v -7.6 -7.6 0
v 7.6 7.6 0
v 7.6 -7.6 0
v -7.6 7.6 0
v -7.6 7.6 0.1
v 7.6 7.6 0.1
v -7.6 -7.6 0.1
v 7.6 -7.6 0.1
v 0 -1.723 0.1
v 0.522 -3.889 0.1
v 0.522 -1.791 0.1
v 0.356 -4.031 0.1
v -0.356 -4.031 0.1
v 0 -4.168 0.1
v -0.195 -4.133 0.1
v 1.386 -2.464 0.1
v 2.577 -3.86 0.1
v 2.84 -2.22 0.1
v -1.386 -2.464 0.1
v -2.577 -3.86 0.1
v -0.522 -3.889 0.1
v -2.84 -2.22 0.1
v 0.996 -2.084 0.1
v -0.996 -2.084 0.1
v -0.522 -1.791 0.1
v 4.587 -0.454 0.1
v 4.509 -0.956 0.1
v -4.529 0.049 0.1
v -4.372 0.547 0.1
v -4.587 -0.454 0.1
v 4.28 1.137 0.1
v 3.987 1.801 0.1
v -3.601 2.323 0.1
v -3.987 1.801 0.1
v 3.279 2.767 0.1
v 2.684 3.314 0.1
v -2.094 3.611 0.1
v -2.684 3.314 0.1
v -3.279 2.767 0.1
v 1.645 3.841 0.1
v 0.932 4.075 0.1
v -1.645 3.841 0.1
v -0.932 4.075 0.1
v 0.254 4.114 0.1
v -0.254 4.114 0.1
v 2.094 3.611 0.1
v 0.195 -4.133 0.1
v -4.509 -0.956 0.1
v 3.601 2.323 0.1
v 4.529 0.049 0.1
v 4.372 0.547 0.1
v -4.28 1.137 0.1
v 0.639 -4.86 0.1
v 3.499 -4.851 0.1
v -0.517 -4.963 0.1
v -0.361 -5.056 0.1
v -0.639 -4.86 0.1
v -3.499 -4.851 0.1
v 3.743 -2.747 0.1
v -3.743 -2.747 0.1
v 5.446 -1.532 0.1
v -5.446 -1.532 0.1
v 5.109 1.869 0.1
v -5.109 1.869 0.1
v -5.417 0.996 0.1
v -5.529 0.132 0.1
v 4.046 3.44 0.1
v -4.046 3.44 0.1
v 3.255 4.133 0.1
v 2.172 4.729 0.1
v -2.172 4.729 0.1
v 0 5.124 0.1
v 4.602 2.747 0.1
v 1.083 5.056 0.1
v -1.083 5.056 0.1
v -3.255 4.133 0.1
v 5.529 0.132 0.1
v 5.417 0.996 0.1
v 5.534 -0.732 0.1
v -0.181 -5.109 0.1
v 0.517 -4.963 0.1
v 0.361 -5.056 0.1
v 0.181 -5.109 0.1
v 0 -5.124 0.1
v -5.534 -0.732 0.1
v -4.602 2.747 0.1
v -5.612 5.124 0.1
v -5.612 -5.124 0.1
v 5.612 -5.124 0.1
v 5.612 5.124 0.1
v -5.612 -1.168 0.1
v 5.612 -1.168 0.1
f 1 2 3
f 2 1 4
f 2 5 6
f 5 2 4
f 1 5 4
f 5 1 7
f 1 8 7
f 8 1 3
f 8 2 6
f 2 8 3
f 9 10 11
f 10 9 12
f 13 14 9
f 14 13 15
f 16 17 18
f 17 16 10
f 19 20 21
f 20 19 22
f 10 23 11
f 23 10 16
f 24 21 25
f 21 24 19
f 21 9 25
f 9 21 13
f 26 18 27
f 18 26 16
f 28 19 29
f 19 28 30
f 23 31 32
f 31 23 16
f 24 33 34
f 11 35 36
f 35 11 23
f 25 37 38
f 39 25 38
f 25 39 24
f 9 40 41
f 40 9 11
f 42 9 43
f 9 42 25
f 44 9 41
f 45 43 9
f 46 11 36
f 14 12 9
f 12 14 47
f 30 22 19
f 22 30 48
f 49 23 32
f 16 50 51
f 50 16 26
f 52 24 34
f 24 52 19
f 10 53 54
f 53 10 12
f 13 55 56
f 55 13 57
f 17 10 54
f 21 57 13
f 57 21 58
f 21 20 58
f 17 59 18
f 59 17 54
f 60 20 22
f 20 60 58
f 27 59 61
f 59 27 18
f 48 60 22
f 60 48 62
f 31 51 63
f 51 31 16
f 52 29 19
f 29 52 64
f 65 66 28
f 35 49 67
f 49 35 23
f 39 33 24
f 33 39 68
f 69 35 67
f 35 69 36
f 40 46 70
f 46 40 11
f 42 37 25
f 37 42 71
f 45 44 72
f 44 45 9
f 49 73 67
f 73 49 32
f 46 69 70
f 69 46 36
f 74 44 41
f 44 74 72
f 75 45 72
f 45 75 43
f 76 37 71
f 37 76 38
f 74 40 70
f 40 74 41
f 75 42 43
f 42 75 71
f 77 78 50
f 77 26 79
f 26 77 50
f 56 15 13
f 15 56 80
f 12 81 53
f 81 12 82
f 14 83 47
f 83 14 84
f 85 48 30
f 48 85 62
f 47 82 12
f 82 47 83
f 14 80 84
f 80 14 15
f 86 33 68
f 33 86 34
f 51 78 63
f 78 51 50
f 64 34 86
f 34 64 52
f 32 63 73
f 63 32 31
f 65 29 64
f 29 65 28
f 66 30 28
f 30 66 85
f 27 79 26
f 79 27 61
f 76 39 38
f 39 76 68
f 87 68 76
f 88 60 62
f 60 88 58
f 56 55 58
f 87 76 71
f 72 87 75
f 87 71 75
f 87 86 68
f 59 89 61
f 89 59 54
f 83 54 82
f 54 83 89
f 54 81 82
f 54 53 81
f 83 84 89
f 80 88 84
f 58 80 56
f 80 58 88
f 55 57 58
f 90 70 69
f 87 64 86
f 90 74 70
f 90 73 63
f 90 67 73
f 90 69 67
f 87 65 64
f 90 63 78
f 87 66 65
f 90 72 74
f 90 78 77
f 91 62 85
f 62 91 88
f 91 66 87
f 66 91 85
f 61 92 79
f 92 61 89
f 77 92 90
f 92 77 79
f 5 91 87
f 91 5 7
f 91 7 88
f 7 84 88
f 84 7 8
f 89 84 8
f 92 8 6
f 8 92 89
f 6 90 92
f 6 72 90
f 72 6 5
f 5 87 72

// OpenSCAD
// file: ../p/box5-12.scad
use <../lib.scad>
function ldraw_lib__box5_12() = [
// 0 Box with 5 Faces without Any Edges
// 0 Name: box5-12.dat
// 0 Author: Chris Dee [cwdee]
// 0 !LDRAW_ORG Primitive UPDATE 2009-02
// 0 !LICENSE Licensed under CC BY 2.0 and CC BY 4.0 : see CAreadme.txt
// 
// 0 BFC CERTIFY CCW
  [0,"BFC","CERTIFY"],
  [0,"BFC","CCW"],
// 
// 0 !HISTORY 2009-09-03 [PTadmin] Official Update 2009-02
// 
// 
// 4 16 1 1 1 1 1 -1 -1 1 -1 -1 1 1
  [4,16,1,1,1,1,1,-1,-1,1,-1,-1,1,1],
// 4 16 -1 0 1 1 0 1 1 1 1 -1 1 1
  [4,16,-1,0,1,1,0,1,1,1,1,-1,1,1],
// 4 16 -1 0 -1 -1 0 1 -1 1 1 -1 1 -1
  [4,16,-1,0,-1,-1,0,1,-1,1,1,-1,1,-1],
// 4 16 1 0 -1 -1 0 -1 -1 1 -1 1 1 -1
  [4,16,1,0,-1,-1,0,-1,-1,1,-1,1,1,-1],
// 4 16 1 0 1 1 0 -1 1 1 -1 1 1 1
  [4,16,1,0,1,1,0,-1,1,1,-1,1,1,1],
// 0
];
module ldraw_lib__box5_12(step=0, col=false, unit=2/5, alt=false, line=0.2, solid=!$preview)
    makepoly(ldraw_lib__box5_12(), step=step, col=col, unit=unit, alt=alt, line=line, solid=solid);
ldraw_lib__box5_12(line=0.2);
// main file
use <../lib.scad>
use <../p/box5-12.scad>
use <s/3004s60.scad>
function ldraw_lib__004695b() = [
// 0 Sticker  1.9 x  1.9 with Shell Logo
// 0 Name: 004695b.dat
// 0 Author: J.C. Tchang [tchang]
// 0 !LDRAW_ORG Part UPDATE 2014-01
// 0 !LICENSE Licensed under CC BY 2.0 and CC BY 4.0 : see CAreadme.txt
// 
// 0 BFC CERTIFY CCW
  [0,"BFC","CERTIFY"],
  [0,"BFC","CCW"],
// 
// 0 !KEYWORDS Set 377
// 
// 0 !HISTORY 2014-06-21 [PTadmin] Official Update 2014-01
// 
// 
// 1 16 0 -0.25 0 19 0 0 0 0.25 0 0 0 19 box5-12.dat
  [1,16,0,-0.25,0,19,0,0,0,0.25,0,0,0,19, ldraw_lib__box5_12()],
// 1 15 0 -0.25 0 1.22 0 0 0 0 1 0 -1.22 0 s\3004s60.dat
  [1,15,0,-0.25,0,1.22,0,0,0,0,1,0,-1.22,0, ldraw_lib__s__3004s60()],
// 
// 4 15 -14.03 -0.25 -2.92068 -14.03 -0.25 12.81 -19 -0.25 19 -19 -0.25 -19
  [4,15,-14.03,-0.25,-2.92068,-14.03,-0.25,12.81,-19,-0.25,19,-19,-0.25,-19],
// 3 15 -14.03 -0.25 -2.92068 -19 -0.25 -19 -14.03 -0.25 -12.81
  [3,15,-14.03,-0.25,-2.92068,-19,-0.25,-19,-14.03,-0.25,-12.81],
// 4 15 0 -0.25 -12.81 -14.03 -0.25 -12.81 -19 -0.25 -19 19 -0.25 -19
  [4,15,0,-0.25,-12.81,-14.03,-0.25,-12.81,-19,-0.25,-19,19,-0.25,-19],
// 3 15 14.03 -0.25 -12.81 0 -0.25 -12.81 19 -0.25 -19
  [3,15,14.03,-0.25,-12.81,0,-0.25,-12.81,19,-0.25,-19],
// 4 15 14.03 -0.25 -2.92068 14.03 -0.25 -12.81 19 -0.25 -19 19 -0.25 19
  [4,15,14.03,-0.25,-2.92068,14.03,-0.25,-12.81,19,-0.25,-19,19,-0.25,19],
// 3 15 19 -0.25 19 14.03 -0.25 12.81 14.03 -0.25 -2.92068
  [3,15,19,-0.25,19,14.03,-0.25,12.81,14.03,-0.25,-2.92068],
// 4 15 0 -0.25 12.81 14.03 -0.25 12.81 19 -0.25 19 -19 -0.25 19
  [4,15,0,-0.25,12.81,14.03,-0.25,12.81,19,-0.25,19,-19,-0.25,19],
// 3 15 -19 -0.25 19 -14.03 -0.25 12.81 0 -0.25 12.81
  [3,15,-19,-0.25,19,-14.03,-0.25,12.81,0,-0.25,12.81],
];
module ldraw_lib__004695b(step=0, col=false, unit=2/5, alt=false, line=0.2, solid=!$preview)
    makepoly(ldraw_lib__004695b(), step=step, col=col, unit=unit, alt=alt, line=line, solid=solid);
ldraw_lib__004695b(line=0.2);
